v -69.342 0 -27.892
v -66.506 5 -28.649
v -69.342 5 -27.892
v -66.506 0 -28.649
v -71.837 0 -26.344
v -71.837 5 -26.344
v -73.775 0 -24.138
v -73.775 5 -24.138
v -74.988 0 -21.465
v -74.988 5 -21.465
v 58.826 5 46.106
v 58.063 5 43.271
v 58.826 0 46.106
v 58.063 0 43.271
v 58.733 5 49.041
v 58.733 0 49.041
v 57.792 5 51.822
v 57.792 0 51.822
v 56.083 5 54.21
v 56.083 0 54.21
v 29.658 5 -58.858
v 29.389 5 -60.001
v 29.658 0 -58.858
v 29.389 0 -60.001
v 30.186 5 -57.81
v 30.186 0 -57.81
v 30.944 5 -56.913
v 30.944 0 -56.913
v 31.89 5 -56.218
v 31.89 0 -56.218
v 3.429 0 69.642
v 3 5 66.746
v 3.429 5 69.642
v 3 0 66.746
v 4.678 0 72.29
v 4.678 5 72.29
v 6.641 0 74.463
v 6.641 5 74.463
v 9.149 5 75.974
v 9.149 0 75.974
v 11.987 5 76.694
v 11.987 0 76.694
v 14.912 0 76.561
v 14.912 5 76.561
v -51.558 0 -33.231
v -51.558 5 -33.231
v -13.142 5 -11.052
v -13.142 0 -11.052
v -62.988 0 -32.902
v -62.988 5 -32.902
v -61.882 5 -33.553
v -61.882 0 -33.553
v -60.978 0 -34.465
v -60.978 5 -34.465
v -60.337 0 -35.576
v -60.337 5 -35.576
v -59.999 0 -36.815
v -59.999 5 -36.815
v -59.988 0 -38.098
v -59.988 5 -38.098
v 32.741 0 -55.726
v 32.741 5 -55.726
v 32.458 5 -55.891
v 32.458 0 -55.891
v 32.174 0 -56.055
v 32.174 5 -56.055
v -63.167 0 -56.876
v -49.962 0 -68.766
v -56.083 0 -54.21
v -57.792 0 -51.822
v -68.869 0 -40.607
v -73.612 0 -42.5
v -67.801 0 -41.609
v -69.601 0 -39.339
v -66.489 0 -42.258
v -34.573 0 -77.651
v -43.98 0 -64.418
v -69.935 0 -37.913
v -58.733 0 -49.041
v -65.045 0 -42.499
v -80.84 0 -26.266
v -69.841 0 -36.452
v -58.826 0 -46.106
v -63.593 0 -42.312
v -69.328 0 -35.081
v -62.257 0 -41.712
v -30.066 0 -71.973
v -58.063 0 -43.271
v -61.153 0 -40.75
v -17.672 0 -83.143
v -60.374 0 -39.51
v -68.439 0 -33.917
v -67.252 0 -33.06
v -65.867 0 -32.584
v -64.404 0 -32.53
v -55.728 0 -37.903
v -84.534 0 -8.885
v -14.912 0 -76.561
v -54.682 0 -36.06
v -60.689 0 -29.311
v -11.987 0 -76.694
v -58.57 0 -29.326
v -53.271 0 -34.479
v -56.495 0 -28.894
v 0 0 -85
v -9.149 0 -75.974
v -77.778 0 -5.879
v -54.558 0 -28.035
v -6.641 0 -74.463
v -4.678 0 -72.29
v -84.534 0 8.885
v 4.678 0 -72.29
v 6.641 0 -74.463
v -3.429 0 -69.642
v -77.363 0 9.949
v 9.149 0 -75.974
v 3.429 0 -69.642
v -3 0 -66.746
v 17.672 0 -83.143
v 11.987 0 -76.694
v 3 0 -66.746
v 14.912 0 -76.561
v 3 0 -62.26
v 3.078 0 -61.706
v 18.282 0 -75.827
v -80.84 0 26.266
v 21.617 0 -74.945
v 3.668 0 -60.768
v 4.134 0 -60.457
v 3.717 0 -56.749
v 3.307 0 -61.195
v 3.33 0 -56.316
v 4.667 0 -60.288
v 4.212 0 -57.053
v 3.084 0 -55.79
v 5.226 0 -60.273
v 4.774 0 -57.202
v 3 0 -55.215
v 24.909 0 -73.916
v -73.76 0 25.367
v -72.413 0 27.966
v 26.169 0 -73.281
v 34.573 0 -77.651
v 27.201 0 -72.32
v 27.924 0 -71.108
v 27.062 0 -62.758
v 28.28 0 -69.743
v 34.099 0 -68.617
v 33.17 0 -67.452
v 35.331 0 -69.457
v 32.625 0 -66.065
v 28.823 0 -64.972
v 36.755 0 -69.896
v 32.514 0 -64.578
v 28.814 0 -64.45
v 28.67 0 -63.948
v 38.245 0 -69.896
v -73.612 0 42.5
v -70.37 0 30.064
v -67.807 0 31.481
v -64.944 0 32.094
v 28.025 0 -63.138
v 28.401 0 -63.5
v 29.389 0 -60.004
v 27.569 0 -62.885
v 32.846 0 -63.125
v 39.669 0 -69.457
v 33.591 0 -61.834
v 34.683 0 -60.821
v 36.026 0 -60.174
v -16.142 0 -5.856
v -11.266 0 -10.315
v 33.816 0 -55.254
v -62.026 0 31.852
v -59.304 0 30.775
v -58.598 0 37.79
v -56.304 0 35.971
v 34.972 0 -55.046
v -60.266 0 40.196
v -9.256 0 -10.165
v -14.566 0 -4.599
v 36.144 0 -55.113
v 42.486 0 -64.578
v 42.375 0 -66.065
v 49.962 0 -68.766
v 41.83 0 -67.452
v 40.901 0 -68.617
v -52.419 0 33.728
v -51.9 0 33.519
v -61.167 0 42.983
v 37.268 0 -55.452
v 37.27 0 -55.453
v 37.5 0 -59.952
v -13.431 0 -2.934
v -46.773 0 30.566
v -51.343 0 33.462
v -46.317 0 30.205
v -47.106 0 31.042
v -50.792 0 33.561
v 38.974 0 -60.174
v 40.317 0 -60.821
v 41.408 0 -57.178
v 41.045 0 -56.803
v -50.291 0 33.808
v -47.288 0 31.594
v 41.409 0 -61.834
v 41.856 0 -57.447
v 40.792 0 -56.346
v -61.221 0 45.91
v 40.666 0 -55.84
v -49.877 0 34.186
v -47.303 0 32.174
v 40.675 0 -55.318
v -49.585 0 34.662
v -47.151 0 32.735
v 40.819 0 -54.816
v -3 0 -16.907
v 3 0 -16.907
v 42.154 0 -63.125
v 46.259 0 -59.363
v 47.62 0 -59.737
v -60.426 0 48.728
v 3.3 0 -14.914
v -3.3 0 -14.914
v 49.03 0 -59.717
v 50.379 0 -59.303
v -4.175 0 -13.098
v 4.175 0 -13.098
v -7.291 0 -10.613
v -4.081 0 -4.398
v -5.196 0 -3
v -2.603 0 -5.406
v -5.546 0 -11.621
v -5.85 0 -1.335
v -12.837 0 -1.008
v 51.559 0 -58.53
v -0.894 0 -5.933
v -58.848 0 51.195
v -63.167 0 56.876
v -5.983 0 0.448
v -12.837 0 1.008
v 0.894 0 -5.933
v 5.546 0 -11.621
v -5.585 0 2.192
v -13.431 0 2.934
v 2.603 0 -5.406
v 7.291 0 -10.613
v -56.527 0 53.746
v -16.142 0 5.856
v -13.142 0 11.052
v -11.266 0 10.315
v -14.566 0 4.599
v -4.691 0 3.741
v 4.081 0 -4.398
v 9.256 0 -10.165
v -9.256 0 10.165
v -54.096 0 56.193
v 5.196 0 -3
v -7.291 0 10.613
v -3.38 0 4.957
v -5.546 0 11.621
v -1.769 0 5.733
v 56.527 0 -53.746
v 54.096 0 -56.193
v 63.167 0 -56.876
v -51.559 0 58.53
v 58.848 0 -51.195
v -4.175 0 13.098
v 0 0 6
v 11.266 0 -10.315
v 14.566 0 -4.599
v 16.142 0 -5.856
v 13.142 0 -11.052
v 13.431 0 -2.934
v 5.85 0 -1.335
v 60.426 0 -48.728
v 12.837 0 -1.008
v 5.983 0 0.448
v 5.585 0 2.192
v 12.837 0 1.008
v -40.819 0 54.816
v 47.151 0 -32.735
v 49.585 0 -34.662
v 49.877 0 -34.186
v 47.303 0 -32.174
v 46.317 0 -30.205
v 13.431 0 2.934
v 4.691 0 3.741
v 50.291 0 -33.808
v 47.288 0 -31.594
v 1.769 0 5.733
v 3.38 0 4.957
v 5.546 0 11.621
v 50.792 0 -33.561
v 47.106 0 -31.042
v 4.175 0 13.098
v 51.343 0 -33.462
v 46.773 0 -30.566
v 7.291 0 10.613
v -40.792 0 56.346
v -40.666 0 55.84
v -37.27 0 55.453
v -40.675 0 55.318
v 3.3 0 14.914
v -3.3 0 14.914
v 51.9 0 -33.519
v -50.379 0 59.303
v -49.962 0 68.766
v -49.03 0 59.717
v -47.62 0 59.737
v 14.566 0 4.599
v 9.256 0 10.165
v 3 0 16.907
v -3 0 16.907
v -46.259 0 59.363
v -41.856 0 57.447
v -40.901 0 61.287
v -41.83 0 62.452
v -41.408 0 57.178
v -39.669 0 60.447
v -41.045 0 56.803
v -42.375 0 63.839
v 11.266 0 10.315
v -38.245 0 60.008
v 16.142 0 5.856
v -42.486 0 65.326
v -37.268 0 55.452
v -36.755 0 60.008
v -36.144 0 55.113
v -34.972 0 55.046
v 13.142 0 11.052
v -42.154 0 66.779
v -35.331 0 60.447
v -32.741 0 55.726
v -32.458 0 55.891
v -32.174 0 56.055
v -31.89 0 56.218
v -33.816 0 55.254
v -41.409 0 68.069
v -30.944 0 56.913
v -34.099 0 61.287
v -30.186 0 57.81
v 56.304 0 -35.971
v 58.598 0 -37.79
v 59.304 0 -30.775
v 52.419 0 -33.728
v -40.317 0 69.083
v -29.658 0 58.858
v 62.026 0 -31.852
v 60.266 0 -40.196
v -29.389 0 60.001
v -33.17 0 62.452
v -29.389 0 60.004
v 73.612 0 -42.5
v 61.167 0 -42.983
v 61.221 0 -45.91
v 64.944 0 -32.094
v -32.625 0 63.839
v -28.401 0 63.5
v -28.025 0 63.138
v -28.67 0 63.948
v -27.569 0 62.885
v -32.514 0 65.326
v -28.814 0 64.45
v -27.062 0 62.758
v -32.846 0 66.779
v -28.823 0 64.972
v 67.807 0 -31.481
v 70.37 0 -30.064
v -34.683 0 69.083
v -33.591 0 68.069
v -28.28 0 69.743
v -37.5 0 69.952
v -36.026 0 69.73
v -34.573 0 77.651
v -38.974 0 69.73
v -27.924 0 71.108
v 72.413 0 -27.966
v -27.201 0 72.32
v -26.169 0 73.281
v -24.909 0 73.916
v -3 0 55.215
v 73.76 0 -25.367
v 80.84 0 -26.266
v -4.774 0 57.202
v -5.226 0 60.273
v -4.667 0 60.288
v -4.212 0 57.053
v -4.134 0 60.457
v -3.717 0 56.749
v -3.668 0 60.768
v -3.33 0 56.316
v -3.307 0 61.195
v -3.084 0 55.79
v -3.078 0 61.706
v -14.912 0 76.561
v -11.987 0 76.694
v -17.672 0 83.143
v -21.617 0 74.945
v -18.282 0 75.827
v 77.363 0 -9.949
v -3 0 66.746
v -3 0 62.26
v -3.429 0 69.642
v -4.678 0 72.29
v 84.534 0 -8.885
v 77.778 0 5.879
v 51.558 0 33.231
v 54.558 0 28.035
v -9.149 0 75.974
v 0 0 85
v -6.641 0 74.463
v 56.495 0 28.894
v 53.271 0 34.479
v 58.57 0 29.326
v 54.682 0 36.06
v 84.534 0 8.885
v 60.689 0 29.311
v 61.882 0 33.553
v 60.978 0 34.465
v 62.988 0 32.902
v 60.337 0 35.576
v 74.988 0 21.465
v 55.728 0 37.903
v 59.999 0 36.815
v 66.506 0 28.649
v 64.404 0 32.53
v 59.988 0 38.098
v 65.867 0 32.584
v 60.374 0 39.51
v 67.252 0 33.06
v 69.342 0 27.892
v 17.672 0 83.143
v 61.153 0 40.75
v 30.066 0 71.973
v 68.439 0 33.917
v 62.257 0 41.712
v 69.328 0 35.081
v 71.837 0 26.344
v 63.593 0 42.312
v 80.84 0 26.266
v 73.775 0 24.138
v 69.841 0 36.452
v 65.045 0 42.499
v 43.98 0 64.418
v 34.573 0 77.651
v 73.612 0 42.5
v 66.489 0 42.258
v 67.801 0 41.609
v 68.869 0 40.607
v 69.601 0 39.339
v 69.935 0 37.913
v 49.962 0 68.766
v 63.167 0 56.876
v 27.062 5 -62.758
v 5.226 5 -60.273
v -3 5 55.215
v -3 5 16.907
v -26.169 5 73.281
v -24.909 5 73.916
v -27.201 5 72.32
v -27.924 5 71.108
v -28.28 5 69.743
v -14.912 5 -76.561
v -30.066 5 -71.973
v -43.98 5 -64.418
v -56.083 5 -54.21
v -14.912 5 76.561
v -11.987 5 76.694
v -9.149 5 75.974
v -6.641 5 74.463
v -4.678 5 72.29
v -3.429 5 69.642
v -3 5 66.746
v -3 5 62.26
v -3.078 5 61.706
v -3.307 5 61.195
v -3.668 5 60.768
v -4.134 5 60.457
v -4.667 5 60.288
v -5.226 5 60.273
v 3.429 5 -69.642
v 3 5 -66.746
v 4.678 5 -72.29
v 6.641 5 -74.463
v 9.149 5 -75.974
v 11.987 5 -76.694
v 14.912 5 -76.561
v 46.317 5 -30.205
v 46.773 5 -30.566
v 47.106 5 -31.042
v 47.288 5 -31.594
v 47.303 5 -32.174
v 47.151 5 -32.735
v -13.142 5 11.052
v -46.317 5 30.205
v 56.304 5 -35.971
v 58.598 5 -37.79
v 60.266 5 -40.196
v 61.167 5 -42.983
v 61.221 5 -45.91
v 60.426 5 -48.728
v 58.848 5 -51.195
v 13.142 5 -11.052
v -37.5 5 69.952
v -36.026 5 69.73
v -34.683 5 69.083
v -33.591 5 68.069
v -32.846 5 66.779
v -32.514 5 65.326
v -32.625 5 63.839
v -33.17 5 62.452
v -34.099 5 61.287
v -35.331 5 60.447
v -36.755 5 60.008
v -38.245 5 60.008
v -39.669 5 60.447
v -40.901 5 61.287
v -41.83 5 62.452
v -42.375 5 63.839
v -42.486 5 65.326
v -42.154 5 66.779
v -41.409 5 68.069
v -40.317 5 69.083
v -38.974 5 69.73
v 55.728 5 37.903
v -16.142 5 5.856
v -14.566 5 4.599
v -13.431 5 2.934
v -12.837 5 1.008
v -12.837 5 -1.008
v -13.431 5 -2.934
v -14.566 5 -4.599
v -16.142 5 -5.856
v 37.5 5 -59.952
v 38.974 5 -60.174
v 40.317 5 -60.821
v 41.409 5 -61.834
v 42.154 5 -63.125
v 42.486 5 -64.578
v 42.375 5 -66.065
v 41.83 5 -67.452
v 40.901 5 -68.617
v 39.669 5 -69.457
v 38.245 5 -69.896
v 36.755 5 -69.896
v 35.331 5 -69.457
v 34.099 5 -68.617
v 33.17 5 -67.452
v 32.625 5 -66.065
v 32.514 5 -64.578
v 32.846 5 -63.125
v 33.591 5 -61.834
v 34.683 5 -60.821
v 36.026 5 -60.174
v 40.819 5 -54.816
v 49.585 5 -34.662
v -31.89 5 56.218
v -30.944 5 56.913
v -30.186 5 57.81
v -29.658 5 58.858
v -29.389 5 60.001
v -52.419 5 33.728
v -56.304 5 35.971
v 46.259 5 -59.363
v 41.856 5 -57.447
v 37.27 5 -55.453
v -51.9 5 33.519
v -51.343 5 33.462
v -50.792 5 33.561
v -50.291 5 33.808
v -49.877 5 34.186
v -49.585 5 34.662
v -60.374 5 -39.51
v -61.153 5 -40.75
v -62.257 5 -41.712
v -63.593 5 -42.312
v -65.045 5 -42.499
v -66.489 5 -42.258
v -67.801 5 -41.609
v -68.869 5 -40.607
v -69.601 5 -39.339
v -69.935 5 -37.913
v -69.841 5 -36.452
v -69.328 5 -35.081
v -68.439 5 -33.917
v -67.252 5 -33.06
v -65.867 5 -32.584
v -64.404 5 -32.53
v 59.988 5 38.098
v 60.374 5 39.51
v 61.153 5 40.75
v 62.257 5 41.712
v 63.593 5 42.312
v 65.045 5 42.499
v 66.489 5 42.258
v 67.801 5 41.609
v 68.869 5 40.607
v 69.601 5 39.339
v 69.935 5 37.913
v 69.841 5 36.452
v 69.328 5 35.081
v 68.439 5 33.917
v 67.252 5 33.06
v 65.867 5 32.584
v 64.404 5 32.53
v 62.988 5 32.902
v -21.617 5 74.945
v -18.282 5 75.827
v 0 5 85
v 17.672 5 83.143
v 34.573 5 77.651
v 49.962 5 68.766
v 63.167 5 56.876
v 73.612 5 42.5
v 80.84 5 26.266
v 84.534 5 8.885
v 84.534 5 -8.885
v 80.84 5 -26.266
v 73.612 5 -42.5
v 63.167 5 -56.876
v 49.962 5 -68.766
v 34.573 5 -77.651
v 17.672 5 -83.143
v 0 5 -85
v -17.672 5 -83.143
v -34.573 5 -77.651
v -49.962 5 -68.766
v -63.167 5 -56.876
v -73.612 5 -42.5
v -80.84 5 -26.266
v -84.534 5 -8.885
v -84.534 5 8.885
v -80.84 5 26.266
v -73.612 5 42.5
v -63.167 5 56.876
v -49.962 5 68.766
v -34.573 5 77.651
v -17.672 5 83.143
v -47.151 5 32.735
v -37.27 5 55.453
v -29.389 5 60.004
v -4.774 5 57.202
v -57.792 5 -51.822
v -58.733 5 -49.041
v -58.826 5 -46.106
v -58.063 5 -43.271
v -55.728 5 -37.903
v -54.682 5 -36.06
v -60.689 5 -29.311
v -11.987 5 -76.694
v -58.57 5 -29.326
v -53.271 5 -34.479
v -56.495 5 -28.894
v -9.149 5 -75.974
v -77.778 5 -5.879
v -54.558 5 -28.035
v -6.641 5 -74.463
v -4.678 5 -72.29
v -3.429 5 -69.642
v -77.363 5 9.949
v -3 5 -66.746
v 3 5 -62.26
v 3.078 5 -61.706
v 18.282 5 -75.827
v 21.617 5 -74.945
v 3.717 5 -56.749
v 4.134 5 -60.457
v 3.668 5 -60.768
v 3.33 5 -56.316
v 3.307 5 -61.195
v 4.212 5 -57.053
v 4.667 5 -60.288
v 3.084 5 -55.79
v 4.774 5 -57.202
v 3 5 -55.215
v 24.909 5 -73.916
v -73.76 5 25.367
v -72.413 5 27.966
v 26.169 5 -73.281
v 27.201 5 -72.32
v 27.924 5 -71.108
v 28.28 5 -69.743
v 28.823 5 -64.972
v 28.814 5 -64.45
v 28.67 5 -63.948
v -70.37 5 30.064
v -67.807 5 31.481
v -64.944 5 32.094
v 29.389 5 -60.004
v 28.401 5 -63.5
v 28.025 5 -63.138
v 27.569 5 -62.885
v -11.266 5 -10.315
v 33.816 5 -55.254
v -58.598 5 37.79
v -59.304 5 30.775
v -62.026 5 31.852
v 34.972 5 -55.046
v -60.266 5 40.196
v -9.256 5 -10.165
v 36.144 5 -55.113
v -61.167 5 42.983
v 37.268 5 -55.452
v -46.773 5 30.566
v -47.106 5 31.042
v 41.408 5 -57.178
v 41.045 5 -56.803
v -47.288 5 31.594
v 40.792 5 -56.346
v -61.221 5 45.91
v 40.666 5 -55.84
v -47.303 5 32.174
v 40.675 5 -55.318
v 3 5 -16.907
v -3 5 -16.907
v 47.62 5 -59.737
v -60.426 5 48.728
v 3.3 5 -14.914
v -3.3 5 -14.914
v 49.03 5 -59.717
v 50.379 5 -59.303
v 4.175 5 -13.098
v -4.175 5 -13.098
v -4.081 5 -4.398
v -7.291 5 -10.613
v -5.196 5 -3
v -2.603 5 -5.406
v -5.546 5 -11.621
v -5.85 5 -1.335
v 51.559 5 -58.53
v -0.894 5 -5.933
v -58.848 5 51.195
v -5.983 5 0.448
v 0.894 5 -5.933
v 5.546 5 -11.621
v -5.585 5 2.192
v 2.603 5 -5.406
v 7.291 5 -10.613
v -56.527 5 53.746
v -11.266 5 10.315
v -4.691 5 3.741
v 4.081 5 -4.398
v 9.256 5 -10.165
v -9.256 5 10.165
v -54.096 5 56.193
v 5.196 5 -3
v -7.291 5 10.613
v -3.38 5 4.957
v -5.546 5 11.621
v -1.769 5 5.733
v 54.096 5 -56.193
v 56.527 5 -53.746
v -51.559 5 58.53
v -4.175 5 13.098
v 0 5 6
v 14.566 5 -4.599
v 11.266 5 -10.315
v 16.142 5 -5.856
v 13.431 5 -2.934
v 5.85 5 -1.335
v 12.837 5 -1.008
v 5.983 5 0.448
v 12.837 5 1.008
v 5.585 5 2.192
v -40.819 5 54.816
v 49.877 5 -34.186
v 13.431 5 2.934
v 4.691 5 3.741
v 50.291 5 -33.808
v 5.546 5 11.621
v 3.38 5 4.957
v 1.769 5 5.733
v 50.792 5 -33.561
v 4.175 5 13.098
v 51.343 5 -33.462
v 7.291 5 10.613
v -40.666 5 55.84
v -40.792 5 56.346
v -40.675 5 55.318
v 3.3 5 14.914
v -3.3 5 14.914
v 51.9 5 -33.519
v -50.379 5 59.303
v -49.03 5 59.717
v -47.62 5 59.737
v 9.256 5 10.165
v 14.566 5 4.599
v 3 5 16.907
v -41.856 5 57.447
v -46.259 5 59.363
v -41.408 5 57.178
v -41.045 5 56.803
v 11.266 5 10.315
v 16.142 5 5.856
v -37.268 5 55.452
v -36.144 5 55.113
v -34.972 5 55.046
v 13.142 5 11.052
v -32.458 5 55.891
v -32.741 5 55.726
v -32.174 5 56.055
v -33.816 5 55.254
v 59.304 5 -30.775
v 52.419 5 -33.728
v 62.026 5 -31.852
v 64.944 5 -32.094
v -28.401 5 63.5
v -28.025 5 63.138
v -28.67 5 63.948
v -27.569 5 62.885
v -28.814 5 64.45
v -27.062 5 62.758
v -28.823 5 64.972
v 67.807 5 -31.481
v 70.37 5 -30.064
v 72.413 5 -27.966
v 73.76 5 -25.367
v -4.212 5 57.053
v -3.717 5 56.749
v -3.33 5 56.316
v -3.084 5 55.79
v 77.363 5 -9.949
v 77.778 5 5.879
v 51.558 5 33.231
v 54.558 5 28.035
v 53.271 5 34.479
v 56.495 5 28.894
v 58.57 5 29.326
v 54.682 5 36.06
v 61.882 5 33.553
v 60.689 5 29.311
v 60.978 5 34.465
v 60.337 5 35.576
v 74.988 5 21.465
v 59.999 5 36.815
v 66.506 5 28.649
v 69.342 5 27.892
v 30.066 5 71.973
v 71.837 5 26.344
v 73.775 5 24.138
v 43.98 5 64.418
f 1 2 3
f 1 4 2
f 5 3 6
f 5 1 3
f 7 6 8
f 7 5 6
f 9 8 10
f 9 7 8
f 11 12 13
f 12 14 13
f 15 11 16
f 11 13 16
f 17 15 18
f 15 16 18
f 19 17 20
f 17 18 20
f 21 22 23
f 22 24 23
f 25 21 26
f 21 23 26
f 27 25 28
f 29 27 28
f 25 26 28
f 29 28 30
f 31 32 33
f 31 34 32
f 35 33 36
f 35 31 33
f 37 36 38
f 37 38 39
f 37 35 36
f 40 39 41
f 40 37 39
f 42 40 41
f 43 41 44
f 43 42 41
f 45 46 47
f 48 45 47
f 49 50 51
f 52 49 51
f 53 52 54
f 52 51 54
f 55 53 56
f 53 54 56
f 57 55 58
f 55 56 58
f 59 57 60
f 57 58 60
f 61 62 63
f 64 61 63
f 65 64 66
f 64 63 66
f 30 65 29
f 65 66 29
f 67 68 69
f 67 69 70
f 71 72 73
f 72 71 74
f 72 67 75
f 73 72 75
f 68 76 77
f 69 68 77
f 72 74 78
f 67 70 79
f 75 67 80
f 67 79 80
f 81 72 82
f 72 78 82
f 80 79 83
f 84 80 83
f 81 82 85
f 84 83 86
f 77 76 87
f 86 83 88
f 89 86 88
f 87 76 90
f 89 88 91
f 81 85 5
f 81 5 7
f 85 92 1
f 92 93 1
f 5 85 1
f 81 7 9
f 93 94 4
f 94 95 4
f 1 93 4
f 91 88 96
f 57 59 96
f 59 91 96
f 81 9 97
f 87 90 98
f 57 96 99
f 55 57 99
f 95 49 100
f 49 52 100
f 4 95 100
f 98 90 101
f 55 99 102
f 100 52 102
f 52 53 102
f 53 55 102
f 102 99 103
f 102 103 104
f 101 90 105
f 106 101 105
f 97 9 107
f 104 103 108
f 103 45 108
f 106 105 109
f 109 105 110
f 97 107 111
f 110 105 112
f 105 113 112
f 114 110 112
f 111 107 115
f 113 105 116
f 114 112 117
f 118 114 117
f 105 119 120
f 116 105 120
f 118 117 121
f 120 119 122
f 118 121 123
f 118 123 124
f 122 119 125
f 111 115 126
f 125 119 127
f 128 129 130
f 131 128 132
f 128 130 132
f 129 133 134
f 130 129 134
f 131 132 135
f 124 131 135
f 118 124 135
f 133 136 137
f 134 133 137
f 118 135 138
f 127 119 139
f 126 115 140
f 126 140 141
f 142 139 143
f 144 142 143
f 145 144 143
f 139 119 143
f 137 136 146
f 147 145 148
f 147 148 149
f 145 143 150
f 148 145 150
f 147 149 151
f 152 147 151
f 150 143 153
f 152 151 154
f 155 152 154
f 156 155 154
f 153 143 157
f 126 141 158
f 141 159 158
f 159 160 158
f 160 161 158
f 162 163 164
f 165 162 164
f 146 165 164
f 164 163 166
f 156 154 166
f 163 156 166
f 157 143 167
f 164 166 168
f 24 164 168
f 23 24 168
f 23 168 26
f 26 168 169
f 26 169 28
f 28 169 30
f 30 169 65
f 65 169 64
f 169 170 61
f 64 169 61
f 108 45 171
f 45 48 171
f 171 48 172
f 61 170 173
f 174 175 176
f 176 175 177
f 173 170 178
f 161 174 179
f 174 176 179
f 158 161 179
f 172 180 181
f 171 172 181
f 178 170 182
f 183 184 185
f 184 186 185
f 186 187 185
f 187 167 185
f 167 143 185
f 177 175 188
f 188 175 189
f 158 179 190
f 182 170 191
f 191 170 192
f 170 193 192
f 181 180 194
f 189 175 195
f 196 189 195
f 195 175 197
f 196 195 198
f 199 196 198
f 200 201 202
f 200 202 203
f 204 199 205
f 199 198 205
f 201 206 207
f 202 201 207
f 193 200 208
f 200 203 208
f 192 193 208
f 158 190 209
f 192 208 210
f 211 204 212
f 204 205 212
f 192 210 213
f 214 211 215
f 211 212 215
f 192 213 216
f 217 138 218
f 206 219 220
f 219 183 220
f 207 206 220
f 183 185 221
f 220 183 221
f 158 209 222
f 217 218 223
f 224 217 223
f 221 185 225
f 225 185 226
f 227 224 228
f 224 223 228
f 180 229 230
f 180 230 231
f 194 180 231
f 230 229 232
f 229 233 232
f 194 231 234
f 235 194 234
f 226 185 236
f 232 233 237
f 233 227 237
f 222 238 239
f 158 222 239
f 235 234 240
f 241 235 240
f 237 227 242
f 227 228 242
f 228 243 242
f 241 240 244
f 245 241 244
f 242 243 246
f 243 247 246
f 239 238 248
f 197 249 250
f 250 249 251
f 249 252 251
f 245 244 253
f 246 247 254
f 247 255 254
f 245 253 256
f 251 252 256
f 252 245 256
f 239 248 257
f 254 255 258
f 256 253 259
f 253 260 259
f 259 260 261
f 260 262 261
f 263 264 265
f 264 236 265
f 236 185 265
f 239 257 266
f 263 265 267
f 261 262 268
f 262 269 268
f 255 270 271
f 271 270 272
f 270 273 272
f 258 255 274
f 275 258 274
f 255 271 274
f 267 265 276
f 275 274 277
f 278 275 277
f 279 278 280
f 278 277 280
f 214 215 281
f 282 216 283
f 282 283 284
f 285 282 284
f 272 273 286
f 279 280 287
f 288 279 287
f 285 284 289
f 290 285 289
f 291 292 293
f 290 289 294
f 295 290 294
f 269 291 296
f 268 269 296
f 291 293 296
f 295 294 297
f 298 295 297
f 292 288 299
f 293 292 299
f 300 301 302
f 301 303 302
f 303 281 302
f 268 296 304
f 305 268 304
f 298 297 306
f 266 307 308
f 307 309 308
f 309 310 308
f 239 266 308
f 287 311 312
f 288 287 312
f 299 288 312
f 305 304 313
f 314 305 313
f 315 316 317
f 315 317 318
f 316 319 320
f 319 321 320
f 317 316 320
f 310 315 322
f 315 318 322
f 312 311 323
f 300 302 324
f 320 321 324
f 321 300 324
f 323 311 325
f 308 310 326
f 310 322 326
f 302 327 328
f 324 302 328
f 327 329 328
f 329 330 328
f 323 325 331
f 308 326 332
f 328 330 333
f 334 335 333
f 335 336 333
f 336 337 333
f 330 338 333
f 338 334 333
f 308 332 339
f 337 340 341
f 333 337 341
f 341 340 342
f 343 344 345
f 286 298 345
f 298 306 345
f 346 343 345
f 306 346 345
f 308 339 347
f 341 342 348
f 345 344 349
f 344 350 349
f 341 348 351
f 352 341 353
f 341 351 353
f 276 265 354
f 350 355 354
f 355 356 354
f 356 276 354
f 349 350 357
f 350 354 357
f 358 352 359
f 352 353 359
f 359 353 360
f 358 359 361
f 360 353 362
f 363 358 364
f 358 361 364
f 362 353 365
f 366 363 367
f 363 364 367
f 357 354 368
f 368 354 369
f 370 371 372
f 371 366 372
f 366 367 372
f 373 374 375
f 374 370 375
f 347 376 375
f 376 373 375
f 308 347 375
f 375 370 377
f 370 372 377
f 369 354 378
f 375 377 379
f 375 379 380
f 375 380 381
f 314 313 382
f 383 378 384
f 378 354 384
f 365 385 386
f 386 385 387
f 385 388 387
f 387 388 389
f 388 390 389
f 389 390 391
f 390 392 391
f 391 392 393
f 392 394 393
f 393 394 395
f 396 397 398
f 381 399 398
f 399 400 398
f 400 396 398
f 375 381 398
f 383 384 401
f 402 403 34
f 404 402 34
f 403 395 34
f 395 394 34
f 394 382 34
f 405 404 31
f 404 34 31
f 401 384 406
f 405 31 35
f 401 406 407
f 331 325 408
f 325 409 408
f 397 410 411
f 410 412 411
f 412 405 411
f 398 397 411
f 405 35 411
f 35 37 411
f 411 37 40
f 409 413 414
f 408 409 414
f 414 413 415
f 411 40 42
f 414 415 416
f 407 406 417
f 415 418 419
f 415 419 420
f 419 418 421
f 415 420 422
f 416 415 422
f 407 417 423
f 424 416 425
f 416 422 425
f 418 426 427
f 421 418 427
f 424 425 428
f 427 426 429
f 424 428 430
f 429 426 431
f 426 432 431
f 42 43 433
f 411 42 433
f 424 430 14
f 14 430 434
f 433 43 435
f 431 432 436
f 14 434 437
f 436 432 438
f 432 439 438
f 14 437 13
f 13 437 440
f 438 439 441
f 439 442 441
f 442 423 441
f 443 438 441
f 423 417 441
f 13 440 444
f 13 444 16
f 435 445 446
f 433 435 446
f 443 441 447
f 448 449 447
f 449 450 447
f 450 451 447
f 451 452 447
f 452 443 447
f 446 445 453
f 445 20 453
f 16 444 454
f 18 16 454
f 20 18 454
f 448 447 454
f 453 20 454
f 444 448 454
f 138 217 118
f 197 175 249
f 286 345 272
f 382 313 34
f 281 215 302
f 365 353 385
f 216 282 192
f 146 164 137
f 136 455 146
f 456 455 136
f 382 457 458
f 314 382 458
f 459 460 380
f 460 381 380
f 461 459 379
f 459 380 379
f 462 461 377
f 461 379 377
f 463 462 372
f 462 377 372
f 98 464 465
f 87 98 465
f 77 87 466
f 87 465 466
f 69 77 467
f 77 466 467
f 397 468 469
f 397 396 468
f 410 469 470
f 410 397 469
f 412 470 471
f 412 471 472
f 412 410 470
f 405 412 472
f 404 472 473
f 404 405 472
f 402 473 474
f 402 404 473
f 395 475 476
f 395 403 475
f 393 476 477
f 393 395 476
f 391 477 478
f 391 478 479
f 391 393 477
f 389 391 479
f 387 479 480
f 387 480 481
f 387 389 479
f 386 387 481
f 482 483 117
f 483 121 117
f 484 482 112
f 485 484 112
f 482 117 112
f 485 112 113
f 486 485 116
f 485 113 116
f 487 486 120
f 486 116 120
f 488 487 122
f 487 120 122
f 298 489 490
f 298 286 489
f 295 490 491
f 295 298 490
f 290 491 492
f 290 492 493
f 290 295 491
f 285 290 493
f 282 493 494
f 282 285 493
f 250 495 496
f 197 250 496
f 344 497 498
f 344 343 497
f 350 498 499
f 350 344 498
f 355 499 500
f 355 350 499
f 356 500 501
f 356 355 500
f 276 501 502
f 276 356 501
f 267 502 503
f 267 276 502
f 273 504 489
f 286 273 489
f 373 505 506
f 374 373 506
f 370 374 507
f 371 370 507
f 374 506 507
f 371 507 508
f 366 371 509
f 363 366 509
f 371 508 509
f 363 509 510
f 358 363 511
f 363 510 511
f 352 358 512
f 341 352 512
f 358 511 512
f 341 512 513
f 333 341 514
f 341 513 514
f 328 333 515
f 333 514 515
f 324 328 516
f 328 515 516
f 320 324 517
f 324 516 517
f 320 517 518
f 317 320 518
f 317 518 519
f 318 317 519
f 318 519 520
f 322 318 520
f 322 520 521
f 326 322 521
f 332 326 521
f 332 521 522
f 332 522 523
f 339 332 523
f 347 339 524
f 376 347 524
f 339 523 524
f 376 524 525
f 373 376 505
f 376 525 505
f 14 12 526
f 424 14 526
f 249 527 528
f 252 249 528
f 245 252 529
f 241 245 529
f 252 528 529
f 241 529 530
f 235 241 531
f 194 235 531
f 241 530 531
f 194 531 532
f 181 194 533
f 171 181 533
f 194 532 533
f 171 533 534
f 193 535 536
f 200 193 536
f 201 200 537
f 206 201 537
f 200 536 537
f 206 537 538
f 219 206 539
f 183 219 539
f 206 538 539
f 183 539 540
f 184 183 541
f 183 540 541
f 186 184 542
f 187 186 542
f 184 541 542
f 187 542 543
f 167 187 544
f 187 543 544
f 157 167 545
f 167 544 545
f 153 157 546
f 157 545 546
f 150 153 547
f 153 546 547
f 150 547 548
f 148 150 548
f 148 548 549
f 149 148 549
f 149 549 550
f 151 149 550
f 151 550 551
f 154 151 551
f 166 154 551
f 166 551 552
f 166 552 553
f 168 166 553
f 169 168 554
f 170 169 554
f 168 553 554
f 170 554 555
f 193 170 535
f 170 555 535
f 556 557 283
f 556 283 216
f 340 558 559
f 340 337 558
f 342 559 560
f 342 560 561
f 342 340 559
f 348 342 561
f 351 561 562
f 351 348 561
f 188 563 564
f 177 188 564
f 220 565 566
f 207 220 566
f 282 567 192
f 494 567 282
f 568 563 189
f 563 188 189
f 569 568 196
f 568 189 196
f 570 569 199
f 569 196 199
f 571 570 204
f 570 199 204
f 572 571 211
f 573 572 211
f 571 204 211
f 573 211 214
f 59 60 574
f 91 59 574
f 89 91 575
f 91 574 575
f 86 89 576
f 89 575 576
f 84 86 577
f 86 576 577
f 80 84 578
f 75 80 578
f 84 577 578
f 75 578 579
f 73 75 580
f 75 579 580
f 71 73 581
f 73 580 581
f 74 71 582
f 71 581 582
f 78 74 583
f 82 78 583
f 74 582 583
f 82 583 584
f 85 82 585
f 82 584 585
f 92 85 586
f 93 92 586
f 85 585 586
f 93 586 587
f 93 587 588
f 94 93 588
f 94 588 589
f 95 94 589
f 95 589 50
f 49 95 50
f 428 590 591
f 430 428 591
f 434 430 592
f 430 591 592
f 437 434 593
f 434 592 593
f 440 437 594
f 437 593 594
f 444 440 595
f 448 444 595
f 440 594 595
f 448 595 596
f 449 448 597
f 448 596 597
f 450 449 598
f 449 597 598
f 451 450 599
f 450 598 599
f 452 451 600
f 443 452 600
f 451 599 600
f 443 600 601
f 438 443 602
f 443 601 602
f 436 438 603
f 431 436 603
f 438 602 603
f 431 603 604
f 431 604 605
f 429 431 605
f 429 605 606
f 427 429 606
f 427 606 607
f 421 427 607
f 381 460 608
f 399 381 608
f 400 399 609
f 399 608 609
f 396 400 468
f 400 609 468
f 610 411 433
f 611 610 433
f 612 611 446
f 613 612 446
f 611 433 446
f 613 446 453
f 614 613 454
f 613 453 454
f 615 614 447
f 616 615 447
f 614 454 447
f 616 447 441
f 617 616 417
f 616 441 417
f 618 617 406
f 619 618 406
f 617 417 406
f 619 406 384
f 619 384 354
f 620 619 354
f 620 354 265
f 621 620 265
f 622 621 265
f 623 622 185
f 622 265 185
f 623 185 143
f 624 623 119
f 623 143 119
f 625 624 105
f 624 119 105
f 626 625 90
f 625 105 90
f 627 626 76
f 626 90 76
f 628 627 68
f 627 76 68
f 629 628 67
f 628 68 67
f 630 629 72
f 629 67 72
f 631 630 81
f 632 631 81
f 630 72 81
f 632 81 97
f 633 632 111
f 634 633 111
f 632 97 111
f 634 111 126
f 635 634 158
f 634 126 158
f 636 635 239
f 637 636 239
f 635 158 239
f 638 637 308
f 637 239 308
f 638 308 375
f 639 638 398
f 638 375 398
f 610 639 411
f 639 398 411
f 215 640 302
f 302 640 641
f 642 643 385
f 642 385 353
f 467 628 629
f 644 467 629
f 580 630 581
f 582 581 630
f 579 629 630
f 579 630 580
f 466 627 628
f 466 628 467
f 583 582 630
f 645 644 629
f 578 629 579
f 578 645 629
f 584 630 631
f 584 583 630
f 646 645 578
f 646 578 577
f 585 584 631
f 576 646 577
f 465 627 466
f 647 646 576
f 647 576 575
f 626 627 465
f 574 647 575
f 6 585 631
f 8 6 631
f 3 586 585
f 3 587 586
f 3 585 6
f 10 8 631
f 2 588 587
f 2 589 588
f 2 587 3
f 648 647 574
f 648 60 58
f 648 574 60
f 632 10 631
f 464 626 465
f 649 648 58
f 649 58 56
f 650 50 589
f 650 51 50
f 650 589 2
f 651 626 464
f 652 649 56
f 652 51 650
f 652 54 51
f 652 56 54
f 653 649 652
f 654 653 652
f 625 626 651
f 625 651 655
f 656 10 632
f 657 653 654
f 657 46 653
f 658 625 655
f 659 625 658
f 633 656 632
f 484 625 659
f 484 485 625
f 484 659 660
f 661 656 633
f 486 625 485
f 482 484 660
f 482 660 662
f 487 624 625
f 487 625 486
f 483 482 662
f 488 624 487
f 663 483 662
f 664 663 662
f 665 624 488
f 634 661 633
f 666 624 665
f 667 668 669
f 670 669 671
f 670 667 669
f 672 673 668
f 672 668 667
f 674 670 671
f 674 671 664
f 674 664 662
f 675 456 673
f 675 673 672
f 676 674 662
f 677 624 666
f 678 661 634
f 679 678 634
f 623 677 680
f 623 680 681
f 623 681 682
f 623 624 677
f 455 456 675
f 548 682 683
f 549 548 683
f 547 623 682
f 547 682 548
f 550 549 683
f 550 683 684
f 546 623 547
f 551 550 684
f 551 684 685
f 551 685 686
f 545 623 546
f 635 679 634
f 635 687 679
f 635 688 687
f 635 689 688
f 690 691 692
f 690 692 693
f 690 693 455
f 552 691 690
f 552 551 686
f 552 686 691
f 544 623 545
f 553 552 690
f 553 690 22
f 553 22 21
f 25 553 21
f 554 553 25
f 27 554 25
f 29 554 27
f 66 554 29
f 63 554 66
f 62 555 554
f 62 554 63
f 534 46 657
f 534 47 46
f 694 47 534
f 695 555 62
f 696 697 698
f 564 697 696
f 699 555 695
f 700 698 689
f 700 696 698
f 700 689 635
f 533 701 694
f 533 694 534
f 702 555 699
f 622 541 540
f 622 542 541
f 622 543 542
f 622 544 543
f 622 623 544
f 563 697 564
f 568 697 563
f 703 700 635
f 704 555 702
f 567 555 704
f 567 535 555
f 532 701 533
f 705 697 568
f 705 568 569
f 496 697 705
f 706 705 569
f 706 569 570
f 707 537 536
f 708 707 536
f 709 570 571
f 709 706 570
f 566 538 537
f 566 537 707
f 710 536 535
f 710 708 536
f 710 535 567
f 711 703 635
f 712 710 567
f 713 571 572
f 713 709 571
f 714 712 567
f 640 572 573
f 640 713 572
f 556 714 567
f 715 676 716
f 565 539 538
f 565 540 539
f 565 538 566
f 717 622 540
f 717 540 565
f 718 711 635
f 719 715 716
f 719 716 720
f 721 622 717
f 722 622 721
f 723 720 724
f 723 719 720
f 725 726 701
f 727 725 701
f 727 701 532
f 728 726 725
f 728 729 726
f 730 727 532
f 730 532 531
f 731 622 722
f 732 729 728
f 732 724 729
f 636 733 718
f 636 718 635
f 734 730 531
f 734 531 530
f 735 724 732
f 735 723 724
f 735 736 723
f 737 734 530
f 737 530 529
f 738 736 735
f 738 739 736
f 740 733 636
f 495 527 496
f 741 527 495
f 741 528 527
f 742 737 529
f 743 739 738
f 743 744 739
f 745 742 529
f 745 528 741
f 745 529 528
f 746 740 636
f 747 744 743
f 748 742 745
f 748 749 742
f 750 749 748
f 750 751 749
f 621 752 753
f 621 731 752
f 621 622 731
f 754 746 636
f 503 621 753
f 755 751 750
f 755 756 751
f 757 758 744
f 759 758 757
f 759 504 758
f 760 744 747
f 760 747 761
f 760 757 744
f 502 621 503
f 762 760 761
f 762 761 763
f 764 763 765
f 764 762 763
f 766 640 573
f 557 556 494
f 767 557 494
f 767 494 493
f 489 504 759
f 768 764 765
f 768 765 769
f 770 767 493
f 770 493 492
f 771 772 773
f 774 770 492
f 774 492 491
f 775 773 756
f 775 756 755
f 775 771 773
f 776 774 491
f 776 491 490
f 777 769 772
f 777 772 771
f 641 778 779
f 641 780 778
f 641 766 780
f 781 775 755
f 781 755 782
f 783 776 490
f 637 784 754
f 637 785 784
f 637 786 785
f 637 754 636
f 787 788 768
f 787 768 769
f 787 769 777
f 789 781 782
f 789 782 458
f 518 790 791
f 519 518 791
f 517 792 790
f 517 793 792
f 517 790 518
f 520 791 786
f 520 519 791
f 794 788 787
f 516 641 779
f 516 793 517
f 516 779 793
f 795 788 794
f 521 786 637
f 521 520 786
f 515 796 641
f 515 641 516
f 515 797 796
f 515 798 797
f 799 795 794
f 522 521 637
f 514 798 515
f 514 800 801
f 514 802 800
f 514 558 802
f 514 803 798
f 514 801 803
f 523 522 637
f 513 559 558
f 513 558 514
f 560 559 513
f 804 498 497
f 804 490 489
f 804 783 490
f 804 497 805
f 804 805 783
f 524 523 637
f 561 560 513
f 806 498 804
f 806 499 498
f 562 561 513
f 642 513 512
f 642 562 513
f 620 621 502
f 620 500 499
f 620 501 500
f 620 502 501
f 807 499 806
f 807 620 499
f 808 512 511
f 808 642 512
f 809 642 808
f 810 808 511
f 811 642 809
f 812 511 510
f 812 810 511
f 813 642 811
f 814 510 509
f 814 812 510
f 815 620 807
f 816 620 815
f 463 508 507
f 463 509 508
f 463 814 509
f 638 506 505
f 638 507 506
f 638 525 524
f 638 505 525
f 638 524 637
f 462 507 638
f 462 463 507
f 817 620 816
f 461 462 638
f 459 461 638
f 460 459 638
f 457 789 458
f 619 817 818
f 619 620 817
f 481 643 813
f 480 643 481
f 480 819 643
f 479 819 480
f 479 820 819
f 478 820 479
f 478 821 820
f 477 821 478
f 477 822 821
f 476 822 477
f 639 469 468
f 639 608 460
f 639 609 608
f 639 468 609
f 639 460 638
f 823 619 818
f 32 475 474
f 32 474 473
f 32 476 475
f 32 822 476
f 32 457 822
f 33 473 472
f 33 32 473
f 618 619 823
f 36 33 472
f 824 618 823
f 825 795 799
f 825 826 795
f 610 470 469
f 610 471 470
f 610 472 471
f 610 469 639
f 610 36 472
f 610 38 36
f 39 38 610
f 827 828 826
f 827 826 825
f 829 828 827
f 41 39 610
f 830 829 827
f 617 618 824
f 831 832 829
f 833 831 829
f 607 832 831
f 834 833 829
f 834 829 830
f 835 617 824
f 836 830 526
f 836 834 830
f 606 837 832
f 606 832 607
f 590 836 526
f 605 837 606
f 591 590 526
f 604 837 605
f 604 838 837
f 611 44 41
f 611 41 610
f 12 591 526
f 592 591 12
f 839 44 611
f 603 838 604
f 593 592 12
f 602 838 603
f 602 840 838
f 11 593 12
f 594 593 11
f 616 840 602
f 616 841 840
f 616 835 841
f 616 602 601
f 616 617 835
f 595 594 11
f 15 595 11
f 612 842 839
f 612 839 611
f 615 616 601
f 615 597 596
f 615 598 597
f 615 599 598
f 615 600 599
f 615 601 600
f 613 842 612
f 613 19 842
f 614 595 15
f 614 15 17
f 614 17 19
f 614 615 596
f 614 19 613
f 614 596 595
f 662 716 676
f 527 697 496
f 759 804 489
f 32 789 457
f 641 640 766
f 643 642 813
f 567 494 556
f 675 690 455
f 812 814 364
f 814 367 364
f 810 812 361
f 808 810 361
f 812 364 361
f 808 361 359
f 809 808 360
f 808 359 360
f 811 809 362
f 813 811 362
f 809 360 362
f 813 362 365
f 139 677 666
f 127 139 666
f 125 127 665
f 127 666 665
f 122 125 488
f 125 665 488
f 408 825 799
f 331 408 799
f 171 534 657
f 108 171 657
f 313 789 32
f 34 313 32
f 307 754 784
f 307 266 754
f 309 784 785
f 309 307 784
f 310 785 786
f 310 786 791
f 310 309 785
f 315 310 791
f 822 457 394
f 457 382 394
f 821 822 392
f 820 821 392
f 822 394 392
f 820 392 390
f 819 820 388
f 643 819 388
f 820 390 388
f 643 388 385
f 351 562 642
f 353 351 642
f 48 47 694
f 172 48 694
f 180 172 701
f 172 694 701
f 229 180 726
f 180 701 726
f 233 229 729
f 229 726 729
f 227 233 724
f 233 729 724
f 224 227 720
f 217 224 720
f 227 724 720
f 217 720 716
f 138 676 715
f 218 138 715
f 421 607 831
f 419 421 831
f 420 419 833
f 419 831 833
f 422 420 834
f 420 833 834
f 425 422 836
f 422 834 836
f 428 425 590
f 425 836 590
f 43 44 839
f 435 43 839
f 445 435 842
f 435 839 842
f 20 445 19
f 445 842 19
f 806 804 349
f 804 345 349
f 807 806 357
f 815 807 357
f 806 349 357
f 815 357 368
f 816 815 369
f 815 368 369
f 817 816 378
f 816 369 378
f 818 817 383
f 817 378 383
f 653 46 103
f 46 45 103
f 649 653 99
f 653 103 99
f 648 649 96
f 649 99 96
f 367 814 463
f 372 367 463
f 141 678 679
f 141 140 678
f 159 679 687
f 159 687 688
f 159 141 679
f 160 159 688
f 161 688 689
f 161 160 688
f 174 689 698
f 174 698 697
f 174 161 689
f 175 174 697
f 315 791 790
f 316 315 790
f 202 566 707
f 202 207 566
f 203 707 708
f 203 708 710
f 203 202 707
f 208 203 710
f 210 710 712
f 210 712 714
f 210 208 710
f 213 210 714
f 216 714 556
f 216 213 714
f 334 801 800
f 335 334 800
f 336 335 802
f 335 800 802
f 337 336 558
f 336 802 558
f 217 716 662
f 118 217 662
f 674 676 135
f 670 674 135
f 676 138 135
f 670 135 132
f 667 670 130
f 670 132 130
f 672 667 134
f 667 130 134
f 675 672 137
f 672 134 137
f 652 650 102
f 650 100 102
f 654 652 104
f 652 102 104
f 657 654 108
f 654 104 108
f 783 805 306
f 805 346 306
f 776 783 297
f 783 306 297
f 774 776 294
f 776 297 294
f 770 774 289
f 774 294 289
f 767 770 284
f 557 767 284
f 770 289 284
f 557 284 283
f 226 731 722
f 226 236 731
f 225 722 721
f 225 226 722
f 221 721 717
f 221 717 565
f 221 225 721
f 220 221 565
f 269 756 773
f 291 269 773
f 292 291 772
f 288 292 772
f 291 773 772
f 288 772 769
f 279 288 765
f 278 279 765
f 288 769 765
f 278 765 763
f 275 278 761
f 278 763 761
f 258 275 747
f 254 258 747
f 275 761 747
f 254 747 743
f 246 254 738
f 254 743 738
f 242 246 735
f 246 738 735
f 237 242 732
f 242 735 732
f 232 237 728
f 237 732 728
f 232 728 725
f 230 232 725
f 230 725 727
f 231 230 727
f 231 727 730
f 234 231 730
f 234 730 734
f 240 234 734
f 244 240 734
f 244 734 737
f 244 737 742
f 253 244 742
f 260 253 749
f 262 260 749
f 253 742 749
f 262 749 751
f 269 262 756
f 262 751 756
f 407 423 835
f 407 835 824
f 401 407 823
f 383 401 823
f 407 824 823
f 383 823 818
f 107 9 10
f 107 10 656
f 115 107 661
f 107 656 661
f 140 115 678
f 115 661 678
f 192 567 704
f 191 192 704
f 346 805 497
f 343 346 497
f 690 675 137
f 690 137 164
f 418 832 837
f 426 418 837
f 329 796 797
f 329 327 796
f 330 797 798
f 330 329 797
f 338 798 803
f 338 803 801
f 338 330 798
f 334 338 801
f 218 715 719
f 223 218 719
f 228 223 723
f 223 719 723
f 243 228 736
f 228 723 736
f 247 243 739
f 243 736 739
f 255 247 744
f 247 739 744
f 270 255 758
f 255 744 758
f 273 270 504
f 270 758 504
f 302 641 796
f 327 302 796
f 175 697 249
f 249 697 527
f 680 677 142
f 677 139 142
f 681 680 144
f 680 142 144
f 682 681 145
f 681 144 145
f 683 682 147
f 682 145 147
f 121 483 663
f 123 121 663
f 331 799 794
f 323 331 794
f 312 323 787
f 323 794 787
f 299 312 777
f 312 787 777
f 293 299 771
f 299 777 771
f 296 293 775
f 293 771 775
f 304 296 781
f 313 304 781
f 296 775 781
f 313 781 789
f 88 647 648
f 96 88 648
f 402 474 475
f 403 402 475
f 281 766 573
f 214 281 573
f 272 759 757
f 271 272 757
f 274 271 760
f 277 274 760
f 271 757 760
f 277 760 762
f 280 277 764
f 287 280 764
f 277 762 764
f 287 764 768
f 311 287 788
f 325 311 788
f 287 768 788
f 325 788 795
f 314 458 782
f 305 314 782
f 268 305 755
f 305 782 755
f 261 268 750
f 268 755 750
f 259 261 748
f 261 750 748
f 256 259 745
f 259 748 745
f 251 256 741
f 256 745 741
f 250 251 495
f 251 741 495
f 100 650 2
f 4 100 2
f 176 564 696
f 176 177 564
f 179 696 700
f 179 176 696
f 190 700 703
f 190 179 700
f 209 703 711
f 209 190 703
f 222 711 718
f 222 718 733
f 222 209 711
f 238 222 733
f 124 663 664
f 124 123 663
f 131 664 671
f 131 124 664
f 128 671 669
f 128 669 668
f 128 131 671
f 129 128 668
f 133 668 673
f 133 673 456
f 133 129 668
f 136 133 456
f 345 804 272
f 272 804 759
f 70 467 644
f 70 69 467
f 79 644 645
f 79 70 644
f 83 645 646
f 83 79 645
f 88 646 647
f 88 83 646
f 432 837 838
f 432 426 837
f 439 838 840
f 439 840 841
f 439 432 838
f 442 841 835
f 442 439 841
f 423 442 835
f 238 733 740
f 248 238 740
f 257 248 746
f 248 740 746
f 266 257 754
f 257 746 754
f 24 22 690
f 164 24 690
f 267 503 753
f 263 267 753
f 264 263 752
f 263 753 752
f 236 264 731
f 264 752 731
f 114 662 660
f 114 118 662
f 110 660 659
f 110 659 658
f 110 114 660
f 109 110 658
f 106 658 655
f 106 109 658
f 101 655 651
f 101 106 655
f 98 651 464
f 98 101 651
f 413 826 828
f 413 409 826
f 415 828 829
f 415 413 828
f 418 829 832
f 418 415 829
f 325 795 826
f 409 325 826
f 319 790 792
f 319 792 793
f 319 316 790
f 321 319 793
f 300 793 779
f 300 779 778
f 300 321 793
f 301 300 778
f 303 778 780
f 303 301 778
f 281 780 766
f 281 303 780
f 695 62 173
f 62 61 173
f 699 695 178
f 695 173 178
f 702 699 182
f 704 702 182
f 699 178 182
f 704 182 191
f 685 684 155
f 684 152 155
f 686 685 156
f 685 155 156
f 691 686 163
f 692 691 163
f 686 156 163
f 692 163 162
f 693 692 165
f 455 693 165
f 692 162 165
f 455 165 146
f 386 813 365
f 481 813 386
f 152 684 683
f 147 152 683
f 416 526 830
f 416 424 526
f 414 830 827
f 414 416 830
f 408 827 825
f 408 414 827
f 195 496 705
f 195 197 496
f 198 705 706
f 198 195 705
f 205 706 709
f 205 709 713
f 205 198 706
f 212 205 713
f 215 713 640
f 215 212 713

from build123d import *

# Parameters (mm, degrees)
SZKIC1_R                    = 85
DODANIE_WYCI_GNI_CIE1_DEPTH = 5
SZKIC2_R                    = 5
SZKIC2_R_2                  = 6
WYTNIJ_WYCI_GNI_CIE2_DEPTH  = 5
ZAOKR_GLENIE2_R             = 10
ZAOKR_GLENIE4_R             = 10
ZAOKR_GLENIE5_R             = 5
DODANIE_WYCI_GNI_CIE2_DEPTH = 5
ZAOKR_GLENIE6_R             = 2


with BuildPart() as part:
    # Szkic1 → Dodanie-wyciągnięcie1 (new body)
    with BuildSketch(Plane(origin=(0, 0, 0), x_dir=(1, 0, 0), z_dir=(0, 1, 0))):
        with Locations(Location((0, 0, 0), (0, 0, 270))):
            Circle(SZKIC1_R)
    extrude(amount=DODANIE_WYCI_GNI_CIE1_DEPTH)

    # Szkic2 → Wytnij-wyciągnięcie2 (cut)
    with BuildSketch(Plane(origin=(0, 5, 0), x_dir=(1, 0, 0), z_dir=(0, 1, 0))):
        with BuildLine():
            Line((3, 77.942286341), (3, 16.907164233))
            ThreePointArc((3, 16.907164233), (6.38067791, 11.051658328), (13.142033731, 11.051658328))
            Line((13.142033731, 11.051658328), (66, 41.569219382))
            ThreePointArc((66, 41.569219382), (58.334842927, 51.778819035), (49.106893514, 60.601262441))
            Line((49.106893514, 60.601262441), (34.87960923, 54.413255334))
            ThreePointArc((34.87960923, 54.413255334), (32.316363874, 55.973584145), (29.683456807, 57.413255334))
            Line((29.683456807, 57.413255334), (27.928786019, 72.828448504))
            ThreePointArc((27.928786019, 72.828448504), (15.674351199, 76.408865418), (3, 77.942286341))
        make_face()
        with BuildLine():
            ThreePointArc((-13.142033731, 11.051658328), (-6.38067791, 11.051658328), (-3, 16.907164233))
            Line((-3, 16.907164233), (-3, 77.942286341))
            ThreePointArc((-3, 77.942286341), (-34.916330218, 69.748475855), (-60.601262441, 49.106893514))
            Line((-60.601262441, 49.106893514), (-54.413255334, 34.87960923))
            Line((-54.413255334, 34.87960923), (-13.142033731, 11.051658328))
        make_face()
        with BuildLine():
            Line((69, 36.373066959), (16.142033731, 5.855505905))
            ThreePointArc((16.142033731, 5.855505905), (12.761355821, 0), (16.142033731, -5.855505905))
            Line((16.142033731, -5.855505905), (57.413255334, -29.683456807))
            Line((57.413255334, -29.683456807), (72.828448504, -27.928786019))
            ThreePointArc((72.828448504, -27.928786019), (77.862117075, 4.635808952), (69, 36.373066959))
        make_face()
        with BuildLine():
            ThreePointArc((-16.142033731, -5.855505905), (-12.761355821, 0), (-16.142033731, 5.855505905))
            Line((-16.142033731, 5.855505905), (-57.413255334, 29.683456807))
            Line((-57.413255334, 29.683456807), (-72.828448504, 27.928786019))
            ThreePointArc((-72.828448504, 27.928786019), (-77.862117075, -4.635808952), (-69, -36.373066959))
            Line((-69, -36.373066959), (-16.142033731, -5.855505905))
        make_face()
        with BuildLine():
            ThreePointArc((-62.987803669, 32.901923789), (-60.621778265, 35), (-59.987803669, 38.098076211))
            ThreePointArc((-59.987803669, 38.098076211), (-69.282032303, 40), (-62.987803669, 32.901923789))
        make_face()
        with BuildLine():
            ThreePointArc((59.987803669, -38.098076211), (69.282032303, -40), (62.987803669, -32.901923789))
            ThreePointArc((62.987803669, -32.901923789), (60.621778265, -35), (59.987803669, -38.098076211))
        make_face()
        with BuildLine():
            Line((60.601262441, -49.106893514), (54.413255334, -34.87960923))
            Line((54.413255334, -34.87960923), (13.142033731, -11.051658328))
            ThreePointArc((13.142033731, -11.051658328), (6.38067791, -11.051658328), (3, -16.907164233))
            Line((3, -16.907164233), (3, -77.942286341))
            ThreePointArc((3, -77.942286341), (34.916330218, -69.748475855), (60.601262441, -49.106893514))
        make_face()
        with BuildLine():
            ThreePointArc((-3, -16.907164233), (-6.38067791, -11.051658328), (-13.142033731, -11.051658328))
            Line((-13.142033731, -11.051658328), (-66, -41.569219382))
            ThreePointArc((-66, -41.569219382), (-58.334842927, -51.778819035), (-49.106893514, -60.601262441))
            Line((-49.106893514, -60.601262441), (-34.87960923, -54.413255334))
            ThreePointArc((-34.87960923, -54.413255334), (-32.316363874, -55.973584145), (-29.683456807, -57.413255334))
            Line((-29.683456807, -57.413255334), (-27.928786019, -72.828448504))
            ThreePointArc((-27.928786019, -72.828448504), (-15.674351199, -76.408865418), (-3, -77.942286341))
            Line((-3, -77.942286341), (-3, -16.907164233))
        make_face()
        with Locations(Location((-37.5, -64.951905284, 0), (0, 0, 270))):
            Circle(SZKIC2_R)
        with Locations(Location((37.5, 64.951905284, 0), (0, 0, 270))):
            Circle(SZKIC2_R)
        with Locations(Location((0, 0, 0), (0, 0, 270))):
            Circle(SZKIC2_R_2)
    extrude(amount=-WYTNIJ_WYCI_GNI_CIE2_DEPTH, mode=Mode.SUBTRACT)

    # Zaokrąglenie2
    zaokr_glenie2_edges = [part.edges().sort_by_distance(p)[0] for p in [
        (-60.601262441, 2.5, -49.106893514),
        (-3, 2.5, -77.942286341),
        (-69, 2.5, 36.373066959),
        (-72.828448504, 2.5, -27.928786019),
        (69, 2.5, -36.373066959),
        (72.828448504, 2.5, 27.928786019),
        (3, 2.5, -77.942286341),
        (66, 2.5, -41.569219382),
        (60.601262441, 2.5, 49.106893514),
        (3, 2.5, 77.942286341),
        (-3, 2.5, 77.942286341),
        (-66, 2.5, 41.569219382),
    ]]
    fillet(zaokr_glenie2_edges, radius=ZAOKR_GLENIE2_R)

    # Zaokrąglenie4
    zaokr_glenie4_edges = [part.edges().sort_by_distance(p)[0] for p in [
        (-54.413255334, 2.5, -34.87960923),
        (-57.413255334, 2.5, -29.683456807),
        (57.413255334, 2.5, 29.683456807),
        (54.413255334, 2.5, 34.87960923),
    ]]
    fillet(zaokr_glenie4_edges, radius=ZAOKR_GLENIE4_R)

    # Zaokrąglenie5
    zaokr_glenie5_edges = [part.edges().sort_by_distance(p)[0] for p in [
        (27.928786019, 2.5, -72.828448504),
        (29.683456807, 2.5, -57.413255334),
        (34.87960923, 2.5, -54.413255334),
        (49.106893514, 2.5, -60.601262441),
        (-27.928786019, 2.5, 72.828448504),
        (-29.683456807, 2.5, 57.413255334),
        (-34.87960923, 2.5, 54.413255334),
        (-49.106893514, 2.5, 60.601262441),
    ]]
    fillet(zaokr_glenie5_edges, radius=ZAOKR_GLENIE5_R)

    # Szkic3 → Dodanie-wyciągnięcie2 (add, through all)
    with BuildSketch(Plane(origin=(0, 5, 0), x_dir=(1, 0, 0), z_dir=(0, 1, 0))):
        Polygon((3, 57), (29.388588378, 60.003743428), (29.049297257, 62.984495269), (3, 60.019372454), align=None)
        Polygon((40.021524319, 56.649677021), (37.270471942, 55.453135831), (47.863448016, 31.098076211), (50.478301265, 32.607762438), align=None)
        Polygon((-47.863448016, -31.098076211), (-37.270471942, -55.453135831), (-40.021524319, -56.649677021), (-50.478301265, -32.607762438), align=None)
        Polygon((-3, -60.019372454), (-3, -57), (-29.388588378, -60.003743428), (-29.049297257, -62.984495269), align=None)
    extrude(amount=-DODANIE_WYCI_GNI_CIE2_DEPTH)

    # Zaokrąglenie6
    zaokr_glenie6_edges = [part.edges().sort_by_distance(p)[0] for p in [
        (3, 2.5, -57),
        (3, 2.5, -60.019372454),
        (29.049297257, 2.5, -62.984495269),
        (40.021524319, 2.5, -56.649677021),
        (50.478301265, 2.5, -32.607762438),
        (47.863448016, 2.5, -31.098076211),
        (-50.478301265, 2.5, 32.607762438),
        (-47.863448016, 2.5, 31.098076211),
        (-40.021524319, 2.5, 56.649677021),
        (-3, 2.5, 60.019372454),
        (-29.049297257, 2.5, 62.984495269),
        (-3, 2.5, 57),
    ]]
    fillet(zaokr_glenie6_edges, radius=ZAOKR_GLENIE6_R)


solid = part.part
